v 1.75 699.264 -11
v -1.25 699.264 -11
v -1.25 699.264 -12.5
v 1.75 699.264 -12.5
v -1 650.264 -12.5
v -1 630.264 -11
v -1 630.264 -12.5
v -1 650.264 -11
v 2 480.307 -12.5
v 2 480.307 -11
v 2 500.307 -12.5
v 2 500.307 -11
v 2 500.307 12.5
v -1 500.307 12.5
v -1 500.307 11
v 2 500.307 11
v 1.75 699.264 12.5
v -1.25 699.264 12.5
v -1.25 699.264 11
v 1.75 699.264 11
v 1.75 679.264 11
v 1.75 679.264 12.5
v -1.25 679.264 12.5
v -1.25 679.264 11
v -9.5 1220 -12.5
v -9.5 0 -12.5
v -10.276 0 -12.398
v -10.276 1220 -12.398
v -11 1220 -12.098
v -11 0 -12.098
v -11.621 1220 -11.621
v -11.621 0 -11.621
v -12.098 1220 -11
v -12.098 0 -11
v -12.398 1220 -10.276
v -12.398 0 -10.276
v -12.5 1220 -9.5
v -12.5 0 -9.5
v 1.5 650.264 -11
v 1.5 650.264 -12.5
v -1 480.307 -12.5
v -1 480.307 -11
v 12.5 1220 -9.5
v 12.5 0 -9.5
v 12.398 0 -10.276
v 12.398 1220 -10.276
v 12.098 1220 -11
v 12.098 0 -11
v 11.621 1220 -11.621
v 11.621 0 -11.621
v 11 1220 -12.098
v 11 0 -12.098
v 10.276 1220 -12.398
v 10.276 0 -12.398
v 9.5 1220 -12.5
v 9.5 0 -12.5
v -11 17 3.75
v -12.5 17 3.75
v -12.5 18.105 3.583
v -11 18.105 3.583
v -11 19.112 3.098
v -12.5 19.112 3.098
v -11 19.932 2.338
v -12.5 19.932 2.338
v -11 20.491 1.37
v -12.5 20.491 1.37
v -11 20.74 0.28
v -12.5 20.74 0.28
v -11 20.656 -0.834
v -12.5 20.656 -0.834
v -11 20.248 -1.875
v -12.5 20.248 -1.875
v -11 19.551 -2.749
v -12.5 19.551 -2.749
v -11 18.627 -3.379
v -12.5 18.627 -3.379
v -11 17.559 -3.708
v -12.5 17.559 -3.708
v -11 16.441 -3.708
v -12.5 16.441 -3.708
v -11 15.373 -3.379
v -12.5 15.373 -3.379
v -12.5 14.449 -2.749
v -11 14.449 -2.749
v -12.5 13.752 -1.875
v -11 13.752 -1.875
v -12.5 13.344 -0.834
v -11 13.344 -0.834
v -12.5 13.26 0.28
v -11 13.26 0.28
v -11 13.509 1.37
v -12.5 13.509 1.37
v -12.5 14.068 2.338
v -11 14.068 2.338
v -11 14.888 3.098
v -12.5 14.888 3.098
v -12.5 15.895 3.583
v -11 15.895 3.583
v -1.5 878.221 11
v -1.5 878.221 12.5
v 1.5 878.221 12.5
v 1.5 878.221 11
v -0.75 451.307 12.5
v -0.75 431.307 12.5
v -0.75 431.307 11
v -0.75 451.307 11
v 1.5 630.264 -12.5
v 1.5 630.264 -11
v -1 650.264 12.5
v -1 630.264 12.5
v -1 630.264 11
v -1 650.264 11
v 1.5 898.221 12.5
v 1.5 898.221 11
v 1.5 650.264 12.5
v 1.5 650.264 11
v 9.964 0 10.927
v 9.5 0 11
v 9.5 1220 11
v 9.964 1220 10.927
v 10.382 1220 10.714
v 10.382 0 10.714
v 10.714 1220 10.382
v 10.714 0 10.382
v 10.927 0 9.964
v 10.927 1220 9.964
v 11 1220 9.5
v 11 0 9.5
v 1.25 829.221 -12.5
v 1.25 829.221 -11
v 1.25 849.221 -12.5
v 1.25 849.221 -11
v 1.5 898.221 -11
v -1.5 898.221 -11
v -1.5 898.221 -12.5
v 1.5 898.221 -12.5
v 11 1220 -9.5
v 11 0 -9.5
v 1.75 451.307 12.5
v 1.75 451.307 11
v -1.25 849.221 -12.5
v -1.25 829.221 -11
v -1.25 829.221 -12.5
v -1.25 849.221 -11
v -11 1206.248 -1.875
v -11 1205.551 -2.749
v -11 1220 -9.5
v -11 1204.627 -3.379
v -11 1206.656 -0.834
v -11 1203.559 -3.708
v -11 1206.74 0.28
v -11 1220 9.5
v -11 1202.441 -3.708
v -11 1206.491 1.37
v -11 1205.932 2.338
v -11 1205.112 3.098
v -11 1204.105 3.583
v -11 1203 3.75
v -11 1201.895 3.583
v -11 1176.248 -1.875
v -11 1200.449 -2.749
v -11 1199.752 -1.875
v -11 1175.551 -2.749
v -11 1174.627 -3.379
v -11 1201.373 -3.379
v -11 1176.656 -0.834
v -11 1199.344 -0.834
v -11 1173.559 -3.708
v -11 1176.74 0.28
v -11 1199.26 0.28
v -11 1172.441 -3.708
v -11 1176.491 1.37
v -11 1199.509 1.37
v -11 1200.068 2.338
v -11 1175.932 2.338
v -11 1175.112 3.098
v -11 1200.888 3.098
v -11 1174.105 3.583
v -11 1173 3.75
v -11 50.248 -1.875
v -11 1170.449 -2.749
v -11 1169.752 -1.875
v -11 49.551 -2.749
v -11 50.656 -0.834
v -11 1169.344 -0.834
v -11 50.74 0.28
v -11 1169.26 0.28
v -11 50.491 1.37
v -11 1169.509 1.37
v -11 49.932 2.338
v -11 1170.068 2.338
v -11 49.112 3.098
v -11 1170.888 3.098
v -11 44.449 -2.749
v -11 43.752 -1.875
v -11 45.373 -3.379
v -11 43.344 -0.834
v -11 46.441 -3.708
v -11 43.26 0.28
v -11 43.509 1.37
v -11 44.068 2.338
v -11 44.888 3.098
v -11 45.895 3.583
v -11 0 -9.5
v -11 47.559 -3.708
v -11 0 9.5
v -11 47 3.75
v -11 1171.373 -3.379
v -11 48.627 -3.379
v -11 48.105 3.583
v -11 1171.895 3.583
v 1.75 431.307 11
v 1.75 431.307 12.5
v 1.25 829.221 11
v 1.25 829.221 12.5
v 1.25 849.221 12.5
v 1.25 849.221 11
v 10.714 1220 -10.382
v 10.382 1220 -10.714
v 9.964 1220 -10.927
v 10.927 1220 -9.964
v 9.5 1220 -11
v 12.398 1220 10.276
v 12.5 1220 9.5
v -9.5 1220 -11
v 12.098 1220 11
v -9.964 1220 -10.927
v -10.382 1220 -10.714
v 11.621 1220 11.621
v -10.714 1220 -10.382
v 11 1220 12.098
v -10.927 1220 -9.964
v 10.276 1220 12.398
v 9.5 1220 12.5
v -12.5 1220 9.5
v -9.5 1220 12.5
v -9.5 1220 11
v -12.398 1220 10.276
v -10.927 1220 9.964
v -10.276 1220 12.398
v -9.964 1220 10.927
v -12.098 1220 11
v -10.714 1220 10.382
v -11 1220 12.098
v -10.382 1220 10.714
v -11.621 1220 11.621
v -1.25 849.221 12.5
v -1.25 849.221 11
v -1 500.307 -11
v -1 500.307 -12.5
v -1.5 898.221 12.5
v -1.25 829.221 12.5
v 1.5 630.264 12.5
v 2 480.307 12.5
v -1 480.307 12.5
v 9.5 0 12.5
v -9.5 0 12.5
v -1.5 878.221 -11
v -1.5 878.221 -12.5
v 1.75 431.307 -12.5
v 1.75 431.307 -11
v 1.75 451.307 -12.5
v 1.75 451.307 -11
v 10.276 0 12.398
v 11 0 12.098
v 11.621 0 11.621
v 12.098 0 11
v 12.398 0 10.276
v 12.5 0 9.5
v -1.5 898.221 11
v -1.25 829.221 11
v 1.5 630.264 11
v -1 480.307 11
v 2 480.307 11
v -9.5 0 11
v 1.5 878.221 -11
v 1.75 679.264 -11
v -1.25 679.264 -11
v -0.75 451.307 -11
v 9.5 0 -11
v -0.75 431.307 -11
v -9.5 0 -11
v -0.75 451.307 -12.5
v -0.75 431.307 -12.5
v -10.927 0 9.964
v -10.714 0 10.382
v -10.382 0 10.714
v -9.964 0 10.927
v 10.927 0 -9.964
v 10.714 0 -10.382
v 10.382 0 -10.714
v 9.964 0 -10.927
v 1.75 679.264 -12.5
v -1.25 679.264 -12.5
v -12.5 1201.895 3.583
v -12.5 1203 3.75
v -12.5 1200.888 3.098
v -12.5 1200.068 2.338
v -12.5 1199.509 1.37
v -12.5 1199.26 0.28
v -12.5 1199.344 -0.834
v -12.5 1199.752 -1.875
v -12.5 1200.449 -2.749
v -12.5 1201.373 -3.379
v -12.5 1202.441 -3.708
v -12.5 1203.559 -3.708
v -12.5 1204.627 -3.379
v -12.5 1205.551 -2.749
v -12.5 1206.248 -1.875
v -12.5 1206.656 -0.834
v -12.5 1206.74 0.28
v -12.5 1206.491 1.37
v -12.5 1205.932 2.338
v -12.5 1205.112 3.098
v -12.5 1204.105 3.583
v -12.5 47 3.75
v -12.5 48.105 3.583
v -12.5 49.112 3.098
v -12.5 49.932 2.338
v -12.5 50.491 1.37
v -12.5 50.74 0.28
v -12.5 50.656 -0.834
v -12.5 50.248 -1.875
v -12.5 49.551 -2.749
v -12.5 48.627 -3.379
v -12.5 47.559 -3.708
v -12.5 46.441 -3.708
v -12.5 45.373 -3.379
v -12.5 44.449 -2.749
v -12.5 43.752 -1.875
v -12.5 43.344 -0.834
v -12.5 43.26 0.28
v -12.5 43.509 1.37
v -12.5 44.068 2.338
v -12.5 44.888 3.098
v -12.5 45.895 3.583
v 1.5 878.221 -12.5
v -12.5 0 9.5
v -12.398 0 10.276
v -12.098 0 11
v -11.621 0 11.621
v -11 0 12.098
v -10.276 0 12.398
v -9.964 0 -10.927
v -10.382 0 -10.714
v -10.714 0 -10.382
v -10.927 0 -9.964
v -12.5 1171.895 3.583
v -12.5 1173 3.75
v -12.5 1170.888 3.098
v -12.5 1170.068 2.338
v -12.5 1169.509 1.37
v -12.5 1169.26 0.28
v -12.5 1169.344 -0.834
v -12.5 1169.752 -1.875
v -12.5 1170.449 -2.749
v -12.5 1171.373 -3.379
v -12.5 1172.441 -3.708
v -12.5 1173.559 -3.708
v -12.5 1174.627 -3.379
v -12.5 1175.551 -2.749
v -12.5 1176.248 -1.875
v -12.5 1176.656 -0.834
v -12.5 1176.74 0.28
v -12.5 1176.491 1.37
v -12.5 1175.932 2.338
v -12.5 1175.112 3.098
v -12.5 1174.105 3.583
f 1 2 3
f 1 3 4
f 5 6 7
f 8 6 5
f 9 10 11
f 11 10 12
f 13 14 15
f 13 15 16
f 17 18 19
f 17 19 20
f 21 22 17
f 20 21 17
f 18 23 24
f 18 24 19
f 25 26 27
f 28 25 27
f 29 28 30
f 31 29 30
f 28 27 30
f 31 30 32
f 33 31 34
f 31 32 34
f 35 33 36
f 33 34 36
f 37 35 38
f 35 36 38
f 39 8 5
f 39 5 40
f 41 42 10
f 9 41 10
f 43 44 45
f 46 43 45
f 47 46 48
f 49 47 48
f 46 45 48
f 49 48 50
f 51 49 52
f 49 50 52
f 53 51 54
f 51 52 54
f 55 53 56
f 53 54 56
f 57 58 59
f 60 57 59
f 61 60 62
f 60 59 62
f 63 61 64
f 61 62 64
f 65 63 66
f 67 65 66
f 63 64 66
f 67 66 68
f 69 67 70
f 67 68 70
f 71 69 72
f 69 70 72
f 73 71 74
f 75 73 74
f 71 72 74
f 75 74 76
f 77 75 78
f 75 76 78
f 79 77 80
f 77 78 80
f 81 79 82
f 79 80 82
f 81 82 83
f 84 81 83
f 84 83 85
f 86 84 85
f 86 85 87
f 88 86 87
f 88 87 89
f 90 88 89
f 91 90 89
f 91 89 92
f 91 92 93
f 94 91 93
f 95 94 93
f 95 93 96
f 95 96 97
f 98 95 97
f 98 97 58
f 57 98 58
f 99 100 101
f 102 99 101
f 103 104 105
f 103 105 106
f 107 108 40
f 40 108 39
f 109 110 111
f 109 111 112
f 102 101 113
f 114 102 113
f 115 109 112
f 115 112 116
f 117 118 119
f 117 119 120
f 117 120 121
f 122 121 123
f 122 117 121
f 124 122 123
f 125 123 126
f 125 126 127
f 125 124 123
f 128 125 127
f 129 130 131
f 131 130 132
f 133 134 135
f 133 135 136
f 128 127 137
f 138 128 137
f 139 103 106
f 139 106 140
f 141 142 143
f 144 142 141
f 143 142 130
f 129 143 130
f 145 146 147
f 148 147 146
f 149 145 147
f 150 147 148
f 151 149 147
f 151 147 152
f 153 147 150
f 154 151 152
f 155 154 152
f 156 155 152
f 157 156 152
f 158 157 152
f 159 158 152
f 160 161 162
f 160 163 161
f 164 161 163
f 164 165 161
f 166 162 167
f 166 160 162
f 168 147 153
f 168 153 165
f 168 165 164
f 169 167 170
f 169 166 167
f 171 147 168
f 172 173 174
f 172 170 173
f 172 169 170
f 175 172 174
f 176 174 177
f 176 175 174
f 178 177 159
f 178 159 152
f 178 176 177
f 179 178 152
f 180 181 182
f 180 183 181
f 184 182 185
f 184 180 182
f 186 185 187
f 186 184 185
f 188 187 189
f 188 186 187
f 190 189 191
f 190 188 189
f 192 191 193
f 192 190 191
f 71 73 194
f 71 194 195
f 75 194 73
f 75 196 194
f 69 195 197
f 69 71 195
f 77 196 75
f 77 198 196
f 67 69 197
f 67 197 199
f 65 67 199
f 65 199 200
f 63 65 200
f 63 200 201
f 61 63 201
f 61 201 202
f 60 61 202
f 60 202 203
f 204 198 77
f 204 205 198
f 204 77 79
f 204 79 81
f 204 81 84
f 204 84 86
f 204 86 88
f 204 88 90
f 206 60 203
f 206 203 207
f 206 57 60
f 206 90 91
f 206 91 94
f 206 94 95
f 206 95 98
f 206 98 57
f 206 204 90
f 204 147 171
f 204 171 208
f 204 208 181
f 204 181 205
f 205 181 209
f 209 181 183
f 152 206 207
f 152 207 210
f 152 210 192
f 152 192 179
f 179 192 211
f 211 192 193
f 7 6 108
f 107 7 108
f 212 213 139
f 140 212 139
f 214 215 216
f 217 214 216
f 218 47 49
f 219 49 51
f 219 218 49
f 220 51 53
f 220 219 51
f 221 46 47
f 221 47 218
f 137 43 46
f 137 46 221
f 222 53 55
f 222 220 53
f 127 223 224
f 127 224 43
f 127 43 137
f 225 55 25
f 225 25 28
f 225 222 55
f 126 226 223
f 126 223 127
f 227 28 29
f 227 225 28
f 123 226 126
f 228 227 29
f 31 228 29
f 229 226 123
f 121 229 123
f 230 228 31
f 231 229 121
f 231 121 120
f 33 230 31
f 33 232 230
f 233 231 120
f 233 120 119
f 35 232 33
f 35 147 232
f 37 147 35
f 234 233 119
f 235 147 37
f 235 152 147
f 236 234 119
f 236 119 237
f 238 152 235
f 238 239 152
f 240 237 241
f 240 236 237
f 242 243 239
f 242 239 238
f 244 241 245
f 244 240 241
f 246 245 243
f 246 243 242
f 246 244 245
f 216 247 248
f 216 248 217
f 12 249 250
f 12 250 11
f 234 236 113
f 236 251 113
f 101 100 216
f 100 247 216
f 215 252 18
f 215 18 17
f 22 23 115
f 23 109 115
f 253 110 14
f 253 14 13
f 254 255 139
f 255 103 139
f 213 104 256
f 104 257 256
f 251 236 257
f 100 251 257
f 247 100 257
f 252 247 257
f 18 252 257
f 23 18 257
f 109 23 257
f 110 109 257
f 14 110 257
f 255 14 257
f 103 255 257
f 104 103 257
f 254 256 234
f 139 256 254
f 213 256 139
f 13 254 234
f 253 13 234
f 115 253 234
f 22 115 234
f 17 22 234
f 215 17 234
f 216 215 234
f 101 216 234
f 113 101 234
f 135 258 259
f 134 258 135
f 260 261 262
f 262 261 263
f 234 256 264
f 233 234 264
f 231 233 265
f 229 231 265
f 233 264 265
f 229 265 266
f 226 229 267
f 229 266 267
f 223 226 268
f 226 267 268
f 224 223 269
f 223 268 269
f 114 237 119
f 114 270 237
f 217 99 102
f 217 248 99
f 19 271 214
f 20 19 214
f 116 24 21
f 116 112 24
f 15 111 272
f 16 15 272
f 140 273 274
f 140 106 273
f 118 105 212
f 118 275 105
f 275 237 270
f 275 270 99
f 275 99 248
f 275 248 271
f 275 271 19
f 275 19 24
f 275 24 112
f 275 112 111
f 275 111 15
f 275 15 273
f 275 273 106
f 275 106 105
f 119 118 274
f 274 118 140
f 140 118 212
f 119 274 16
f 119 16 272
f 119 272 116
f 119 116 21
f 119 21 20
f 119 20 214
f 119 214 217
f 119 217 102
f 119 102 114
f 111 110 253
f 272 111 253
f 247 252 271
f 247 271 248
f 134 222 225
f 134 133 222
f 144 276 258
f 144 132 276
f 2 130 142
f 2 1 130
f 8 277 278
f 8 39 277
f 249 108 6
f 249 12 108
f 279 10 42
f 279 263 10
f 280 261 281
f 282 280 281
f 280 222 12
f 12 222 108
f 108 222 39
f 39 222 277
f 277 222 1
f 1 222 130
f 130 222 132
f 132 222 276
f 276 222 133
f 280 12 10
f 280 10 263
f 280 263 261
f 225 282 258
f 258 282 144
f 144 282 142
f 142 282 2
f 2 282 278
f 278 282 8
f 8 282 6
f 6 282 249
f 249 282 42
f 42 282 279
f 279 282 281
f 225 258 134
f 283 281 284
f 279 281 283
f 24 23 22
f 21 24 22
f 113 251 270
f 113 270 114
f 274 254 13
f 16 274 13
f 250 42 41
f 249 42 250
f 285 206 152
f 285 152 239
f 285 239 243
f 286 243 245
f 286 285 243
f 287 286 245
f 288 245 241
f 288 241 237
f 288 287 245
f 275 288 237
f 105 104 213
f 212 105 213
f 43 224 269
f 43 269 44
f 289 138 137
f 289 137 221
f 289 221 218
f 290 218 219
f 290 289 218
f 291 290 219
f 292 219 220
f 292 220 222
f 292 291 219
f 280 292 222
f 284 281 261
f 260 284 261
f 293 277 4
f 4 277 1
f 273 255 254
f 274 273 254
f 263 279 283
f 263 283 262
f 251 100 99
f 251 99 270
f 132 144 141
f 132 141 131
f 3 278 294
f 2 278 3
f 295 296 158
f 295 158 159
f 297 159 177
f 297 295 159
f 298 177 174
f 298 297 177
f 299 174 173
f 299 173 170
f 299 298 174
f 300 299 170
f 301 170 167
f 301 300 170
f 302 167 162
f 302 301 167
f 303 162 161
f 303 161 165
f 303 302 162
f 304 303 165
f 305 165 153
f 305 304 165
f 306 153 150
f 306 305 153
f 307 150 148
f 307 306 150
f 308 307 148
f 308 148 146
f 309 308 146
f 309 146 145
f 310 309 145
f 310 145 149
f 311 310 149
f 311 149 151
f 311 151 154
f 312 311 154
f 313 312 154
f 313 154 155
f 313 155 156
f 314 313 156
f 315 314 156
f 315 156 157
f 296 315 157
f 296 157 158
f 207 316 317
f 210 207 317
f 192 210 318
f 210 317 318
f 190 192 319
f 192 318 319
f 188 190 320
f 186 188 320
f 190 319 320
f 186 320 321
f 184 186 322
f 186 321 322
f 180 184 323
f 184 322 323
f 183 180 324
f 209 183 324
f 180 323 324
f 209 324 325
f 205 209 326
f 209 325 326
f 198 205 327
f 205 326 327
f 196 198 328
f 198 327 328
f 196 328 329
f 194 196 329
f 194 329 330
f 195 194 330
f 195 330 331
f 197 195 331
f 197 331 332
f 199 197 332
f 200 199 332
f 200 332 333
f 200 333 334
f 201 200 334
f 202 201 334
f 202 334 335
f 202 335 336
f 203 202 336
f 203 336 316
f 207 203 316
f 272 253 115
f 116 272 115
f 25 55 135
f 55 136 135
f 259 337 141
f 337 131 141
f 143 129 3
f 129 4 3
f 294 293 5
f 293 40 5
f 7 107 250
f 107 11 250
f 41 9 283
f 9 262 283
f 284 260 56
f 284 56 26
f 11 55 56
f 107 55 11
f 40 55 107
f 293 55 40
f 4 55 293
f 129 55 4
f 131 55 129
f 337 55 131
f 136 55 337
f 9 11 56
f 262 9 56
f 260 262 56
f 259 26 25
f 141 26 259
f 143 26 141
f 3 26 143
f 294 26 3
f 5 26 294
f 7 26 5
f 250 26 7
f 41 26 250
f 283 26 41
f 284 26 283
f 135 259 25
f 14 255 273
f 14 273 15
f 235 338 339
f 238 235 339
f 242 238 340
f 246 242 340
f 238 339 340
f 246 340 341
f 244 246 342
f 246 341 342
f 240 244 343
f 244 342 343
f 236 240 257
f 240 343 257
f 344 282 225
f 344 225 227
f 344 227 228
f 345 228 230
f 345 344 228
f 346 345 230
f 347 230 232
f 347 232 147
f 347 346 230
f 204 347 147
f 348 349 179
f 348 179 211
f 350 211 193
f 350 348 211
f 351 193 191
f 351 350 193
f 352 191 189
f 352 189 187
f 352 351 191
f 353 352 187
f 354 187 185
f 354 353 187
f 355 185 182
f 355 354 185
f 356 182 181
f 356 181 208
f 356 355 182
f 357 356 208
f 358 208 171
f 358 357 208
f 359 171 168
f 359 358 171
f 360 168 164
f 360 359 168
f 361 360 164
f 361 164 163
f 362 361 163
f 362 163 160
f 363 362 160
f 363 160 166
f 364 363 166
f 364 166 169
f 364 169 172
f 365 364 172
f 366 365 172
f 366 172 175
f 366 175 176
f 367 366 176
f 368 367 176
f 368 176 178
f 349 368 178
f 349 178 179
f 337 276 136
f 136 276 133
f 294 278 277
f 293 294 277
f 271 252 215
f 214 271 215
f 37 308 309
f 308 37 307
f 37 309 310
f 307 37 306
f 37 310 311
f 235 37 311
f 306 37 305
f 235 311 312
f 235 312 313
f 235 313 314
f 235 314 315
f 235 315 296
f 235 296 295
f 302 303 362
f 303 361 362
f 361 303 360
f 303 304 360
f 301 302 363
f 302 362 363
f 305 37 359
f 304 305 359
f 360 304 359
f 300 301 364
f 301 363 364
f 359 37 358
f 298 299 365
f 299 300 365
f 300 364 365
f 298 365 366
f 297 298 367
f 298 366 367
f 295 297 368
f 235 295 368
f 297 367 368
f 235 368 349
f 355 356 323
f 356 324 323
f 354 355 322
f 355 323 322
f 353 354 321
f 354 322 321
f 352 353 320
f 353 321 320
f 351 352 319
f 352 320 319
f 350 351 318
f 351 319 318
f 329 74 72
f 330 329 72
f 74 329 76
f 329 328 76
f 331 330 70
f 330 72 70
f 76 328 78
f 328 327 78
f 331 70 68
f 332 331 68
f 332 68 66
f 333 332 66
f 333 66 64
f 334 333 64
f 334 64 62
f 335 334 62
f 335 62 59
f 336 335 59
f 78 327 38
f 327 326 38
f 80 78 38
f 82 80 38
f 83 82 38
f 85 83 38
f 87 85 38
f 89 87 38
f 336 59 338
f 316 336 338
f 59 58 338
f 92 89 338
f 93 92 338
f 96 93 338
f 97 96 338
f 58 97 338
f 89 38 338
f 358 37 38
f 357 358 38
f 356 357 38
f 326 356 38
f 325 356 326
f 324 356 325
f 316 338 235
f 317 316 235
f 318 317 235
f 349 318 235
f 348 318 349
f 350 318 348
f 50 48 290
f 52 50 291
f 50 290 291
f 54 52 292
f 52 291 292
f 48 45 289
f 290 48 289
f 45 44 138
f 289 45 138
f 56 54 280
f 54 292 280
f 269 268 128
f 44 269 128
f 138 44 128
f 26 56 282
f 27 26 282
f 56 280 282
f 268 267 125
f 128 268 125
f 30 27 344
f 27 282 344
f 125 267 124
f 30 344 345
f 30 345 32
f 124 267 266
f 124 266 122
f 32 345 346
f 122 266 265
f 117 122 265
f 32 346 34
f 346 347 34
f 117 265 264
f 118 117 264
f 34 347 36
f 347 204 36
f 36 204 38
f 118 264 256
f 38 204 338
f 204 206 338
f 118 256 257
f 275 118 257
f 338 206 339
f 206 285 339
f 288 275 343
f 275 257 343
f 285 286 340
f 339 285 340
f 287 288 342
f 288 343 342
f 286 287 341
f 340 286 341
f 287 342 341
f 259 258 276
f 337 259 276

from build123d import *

# Parameters (mm, degrees)
SQUARE_TUBE_CONFIGURED_20_X_20_X_2_1_DEPTH = 1220
CUT_EXTRUDE_1_REACH                        = 1222.32
SKETCH_2_R                                 = 3.75
SKETCH_3_W                                 = 3
SKETCH_3_H                                 = 20
SKETCH_3_W_2                               = 2.5
CUT_EXTRUDE_2_DEPTH                        = 1221.320142422


with BuildPart() as part:
    # Sketch1 → Square tube - configured 20 X 20 X 2(1) (new body)
    with BuildSketch(Plane(origin=(0, 0, 0), x_dir=(-1, 0, 0), z_dir=(0, 1, 0))):
        with BuildLine():
            Line((-9.5, -12.5), (9.5, -12.5))
            ThreePointArc((9.5, -12.5), (11.621320344, -11.621320344), (12.5, -9.5))
            Line((12.5, -9.5), (12.5, 9.5))
            ThreePointArc((12.5, 9.5), (11.621320344, 11.621320344), (9.5, 12.5))
            Line((9.5, 12.5), (-9.5, 12.5))
            ThreePointArc((-9.5, 12.5), (-11.621320344, 11.621320344), (-12.5, 9.5))
            Line((-12.5, 9.5), (-12.5, -9.5))
            ThreePointArc((-12.5, -9.5), (-11.621320344, -11.621320344), (-9.5, -12.5))
        make_face()
        with BuildLine():
            Line((-9.5, -11), (9.5, -11))
            ThreePointArc((9.5, -11), (10.560660172, -10.560660172), (11, -9.5))
            Line((11, -9.5), (11, 9.5))
            ThreePointArc((11, 9.5), (10.560660172, 10.560660172), (9.5, 11))
            Line((9.5, 11), (-9.5, 11))
            ThreePointArc((-9.5, 11), (-10.560660172, 10.560660172), (-11, 9.5))
            Line((-11, 9.5), (-11, -9.5))
            ThreePointArc((-11, -9.5), (-10.560660172, -10.560660172), (-9.5, -11))
        make_face(mode=Mode.SUBTRACT)
    extrude(amount=SQUARE_TUBE_CONFIGURED_20_X_20_X_2_1_DEPTH)

    # Эскиз2 → Вырез-Вытянуть1 (cut, up to next)
    with BuildSketch(Plane.ZY.offset(12.5), mode=Mode.PRIVATE) as cut_extrude_1_sk1:
        with Locations((0, 17)):
            Circle(SKETCH_2_R)
    cut_extrude_1_tool1 = extrude(cut_extrude_1_sk1.sketch, amount=-CUT_EXTRUDE_1_REACH, mode=Mode.PRIVATE) & part.part
    # Эскиз2 → Вырез-Вытянуть1 (cut, up to next)
    with BuildSketch(Plane.ZY.offset(12.5), mode=Mode.PRIVATE) as cut_extrude_1_sk2:
        with Locations((0, 47)):
            Circle(SKETCH_2_R)
    cut_extrude_1_tool2 = extrude(cut_extrude_1_sk2.sketch, amount=-CUT_EXTRUDE_1_REACH, mode=Mode.PRIVATE) & part.part
    cut_extrude_1_1 = cut_extrude_1_tool1.solids().sort_by_distance((-12.5, 17, 0))[0]
    add(cut_extrude_1_1, mode=Mode.SUBTRACT)
    cut_extrude_1_2 = cut_extrude_1_tool2.solids().sort_by_distance((-12.5, 47, 0))[0]
    add(cut_extrude_1_2, mode=Mode.SUBTRACT)
    cut_extrude_1 = cut_extrude_1_1 + cut_extrude_1_2  # Вырез-Вытянуть1 as one shape, for the pattern or mirror that repeats it

    # Зеркальное отражение1: Вырез-Вытянуть1 across plane
    add(cut_extrude_1.mirror(Plane.ZX.offset(610)), mode=Mode.SUBTRACT)

    # Эскиз3 → Вырез-Вытянуть2 (cut, through all)
    with BuildSketch(Plane.XY.offset(12.5)):
        with Locations((0, 888.220627209)):
            Rectangle(SKETCH_3_W, SKETCH_3_H)
        with Locations((0, 839.220627209)):
            Rectangle(SKETCH_3_W_2, SKETCH_3_H)
        with Locations((0.25, 689.264040992)):
            Rectangle(SKETCH_3_W, SKETCH_3_H)
        with Locations((0.25, 640.264040992)):
            Rectangle(SKETCH_3_W_2, SKETCH_3_H)
        with Locations((0.5, 490.307454775)):
            Rectangle(SKETCH_3_W, SKETCH_3_H)
        with Locations((0.5, 441.307454775)):
            Rectangle(SKETCH_3_W_2, SKETCH_3_H)
    extrude(amount=-CUT_EXTRUDE_2_DEPTH, mode=Mode.SUBTRACT)


solid = part.part
